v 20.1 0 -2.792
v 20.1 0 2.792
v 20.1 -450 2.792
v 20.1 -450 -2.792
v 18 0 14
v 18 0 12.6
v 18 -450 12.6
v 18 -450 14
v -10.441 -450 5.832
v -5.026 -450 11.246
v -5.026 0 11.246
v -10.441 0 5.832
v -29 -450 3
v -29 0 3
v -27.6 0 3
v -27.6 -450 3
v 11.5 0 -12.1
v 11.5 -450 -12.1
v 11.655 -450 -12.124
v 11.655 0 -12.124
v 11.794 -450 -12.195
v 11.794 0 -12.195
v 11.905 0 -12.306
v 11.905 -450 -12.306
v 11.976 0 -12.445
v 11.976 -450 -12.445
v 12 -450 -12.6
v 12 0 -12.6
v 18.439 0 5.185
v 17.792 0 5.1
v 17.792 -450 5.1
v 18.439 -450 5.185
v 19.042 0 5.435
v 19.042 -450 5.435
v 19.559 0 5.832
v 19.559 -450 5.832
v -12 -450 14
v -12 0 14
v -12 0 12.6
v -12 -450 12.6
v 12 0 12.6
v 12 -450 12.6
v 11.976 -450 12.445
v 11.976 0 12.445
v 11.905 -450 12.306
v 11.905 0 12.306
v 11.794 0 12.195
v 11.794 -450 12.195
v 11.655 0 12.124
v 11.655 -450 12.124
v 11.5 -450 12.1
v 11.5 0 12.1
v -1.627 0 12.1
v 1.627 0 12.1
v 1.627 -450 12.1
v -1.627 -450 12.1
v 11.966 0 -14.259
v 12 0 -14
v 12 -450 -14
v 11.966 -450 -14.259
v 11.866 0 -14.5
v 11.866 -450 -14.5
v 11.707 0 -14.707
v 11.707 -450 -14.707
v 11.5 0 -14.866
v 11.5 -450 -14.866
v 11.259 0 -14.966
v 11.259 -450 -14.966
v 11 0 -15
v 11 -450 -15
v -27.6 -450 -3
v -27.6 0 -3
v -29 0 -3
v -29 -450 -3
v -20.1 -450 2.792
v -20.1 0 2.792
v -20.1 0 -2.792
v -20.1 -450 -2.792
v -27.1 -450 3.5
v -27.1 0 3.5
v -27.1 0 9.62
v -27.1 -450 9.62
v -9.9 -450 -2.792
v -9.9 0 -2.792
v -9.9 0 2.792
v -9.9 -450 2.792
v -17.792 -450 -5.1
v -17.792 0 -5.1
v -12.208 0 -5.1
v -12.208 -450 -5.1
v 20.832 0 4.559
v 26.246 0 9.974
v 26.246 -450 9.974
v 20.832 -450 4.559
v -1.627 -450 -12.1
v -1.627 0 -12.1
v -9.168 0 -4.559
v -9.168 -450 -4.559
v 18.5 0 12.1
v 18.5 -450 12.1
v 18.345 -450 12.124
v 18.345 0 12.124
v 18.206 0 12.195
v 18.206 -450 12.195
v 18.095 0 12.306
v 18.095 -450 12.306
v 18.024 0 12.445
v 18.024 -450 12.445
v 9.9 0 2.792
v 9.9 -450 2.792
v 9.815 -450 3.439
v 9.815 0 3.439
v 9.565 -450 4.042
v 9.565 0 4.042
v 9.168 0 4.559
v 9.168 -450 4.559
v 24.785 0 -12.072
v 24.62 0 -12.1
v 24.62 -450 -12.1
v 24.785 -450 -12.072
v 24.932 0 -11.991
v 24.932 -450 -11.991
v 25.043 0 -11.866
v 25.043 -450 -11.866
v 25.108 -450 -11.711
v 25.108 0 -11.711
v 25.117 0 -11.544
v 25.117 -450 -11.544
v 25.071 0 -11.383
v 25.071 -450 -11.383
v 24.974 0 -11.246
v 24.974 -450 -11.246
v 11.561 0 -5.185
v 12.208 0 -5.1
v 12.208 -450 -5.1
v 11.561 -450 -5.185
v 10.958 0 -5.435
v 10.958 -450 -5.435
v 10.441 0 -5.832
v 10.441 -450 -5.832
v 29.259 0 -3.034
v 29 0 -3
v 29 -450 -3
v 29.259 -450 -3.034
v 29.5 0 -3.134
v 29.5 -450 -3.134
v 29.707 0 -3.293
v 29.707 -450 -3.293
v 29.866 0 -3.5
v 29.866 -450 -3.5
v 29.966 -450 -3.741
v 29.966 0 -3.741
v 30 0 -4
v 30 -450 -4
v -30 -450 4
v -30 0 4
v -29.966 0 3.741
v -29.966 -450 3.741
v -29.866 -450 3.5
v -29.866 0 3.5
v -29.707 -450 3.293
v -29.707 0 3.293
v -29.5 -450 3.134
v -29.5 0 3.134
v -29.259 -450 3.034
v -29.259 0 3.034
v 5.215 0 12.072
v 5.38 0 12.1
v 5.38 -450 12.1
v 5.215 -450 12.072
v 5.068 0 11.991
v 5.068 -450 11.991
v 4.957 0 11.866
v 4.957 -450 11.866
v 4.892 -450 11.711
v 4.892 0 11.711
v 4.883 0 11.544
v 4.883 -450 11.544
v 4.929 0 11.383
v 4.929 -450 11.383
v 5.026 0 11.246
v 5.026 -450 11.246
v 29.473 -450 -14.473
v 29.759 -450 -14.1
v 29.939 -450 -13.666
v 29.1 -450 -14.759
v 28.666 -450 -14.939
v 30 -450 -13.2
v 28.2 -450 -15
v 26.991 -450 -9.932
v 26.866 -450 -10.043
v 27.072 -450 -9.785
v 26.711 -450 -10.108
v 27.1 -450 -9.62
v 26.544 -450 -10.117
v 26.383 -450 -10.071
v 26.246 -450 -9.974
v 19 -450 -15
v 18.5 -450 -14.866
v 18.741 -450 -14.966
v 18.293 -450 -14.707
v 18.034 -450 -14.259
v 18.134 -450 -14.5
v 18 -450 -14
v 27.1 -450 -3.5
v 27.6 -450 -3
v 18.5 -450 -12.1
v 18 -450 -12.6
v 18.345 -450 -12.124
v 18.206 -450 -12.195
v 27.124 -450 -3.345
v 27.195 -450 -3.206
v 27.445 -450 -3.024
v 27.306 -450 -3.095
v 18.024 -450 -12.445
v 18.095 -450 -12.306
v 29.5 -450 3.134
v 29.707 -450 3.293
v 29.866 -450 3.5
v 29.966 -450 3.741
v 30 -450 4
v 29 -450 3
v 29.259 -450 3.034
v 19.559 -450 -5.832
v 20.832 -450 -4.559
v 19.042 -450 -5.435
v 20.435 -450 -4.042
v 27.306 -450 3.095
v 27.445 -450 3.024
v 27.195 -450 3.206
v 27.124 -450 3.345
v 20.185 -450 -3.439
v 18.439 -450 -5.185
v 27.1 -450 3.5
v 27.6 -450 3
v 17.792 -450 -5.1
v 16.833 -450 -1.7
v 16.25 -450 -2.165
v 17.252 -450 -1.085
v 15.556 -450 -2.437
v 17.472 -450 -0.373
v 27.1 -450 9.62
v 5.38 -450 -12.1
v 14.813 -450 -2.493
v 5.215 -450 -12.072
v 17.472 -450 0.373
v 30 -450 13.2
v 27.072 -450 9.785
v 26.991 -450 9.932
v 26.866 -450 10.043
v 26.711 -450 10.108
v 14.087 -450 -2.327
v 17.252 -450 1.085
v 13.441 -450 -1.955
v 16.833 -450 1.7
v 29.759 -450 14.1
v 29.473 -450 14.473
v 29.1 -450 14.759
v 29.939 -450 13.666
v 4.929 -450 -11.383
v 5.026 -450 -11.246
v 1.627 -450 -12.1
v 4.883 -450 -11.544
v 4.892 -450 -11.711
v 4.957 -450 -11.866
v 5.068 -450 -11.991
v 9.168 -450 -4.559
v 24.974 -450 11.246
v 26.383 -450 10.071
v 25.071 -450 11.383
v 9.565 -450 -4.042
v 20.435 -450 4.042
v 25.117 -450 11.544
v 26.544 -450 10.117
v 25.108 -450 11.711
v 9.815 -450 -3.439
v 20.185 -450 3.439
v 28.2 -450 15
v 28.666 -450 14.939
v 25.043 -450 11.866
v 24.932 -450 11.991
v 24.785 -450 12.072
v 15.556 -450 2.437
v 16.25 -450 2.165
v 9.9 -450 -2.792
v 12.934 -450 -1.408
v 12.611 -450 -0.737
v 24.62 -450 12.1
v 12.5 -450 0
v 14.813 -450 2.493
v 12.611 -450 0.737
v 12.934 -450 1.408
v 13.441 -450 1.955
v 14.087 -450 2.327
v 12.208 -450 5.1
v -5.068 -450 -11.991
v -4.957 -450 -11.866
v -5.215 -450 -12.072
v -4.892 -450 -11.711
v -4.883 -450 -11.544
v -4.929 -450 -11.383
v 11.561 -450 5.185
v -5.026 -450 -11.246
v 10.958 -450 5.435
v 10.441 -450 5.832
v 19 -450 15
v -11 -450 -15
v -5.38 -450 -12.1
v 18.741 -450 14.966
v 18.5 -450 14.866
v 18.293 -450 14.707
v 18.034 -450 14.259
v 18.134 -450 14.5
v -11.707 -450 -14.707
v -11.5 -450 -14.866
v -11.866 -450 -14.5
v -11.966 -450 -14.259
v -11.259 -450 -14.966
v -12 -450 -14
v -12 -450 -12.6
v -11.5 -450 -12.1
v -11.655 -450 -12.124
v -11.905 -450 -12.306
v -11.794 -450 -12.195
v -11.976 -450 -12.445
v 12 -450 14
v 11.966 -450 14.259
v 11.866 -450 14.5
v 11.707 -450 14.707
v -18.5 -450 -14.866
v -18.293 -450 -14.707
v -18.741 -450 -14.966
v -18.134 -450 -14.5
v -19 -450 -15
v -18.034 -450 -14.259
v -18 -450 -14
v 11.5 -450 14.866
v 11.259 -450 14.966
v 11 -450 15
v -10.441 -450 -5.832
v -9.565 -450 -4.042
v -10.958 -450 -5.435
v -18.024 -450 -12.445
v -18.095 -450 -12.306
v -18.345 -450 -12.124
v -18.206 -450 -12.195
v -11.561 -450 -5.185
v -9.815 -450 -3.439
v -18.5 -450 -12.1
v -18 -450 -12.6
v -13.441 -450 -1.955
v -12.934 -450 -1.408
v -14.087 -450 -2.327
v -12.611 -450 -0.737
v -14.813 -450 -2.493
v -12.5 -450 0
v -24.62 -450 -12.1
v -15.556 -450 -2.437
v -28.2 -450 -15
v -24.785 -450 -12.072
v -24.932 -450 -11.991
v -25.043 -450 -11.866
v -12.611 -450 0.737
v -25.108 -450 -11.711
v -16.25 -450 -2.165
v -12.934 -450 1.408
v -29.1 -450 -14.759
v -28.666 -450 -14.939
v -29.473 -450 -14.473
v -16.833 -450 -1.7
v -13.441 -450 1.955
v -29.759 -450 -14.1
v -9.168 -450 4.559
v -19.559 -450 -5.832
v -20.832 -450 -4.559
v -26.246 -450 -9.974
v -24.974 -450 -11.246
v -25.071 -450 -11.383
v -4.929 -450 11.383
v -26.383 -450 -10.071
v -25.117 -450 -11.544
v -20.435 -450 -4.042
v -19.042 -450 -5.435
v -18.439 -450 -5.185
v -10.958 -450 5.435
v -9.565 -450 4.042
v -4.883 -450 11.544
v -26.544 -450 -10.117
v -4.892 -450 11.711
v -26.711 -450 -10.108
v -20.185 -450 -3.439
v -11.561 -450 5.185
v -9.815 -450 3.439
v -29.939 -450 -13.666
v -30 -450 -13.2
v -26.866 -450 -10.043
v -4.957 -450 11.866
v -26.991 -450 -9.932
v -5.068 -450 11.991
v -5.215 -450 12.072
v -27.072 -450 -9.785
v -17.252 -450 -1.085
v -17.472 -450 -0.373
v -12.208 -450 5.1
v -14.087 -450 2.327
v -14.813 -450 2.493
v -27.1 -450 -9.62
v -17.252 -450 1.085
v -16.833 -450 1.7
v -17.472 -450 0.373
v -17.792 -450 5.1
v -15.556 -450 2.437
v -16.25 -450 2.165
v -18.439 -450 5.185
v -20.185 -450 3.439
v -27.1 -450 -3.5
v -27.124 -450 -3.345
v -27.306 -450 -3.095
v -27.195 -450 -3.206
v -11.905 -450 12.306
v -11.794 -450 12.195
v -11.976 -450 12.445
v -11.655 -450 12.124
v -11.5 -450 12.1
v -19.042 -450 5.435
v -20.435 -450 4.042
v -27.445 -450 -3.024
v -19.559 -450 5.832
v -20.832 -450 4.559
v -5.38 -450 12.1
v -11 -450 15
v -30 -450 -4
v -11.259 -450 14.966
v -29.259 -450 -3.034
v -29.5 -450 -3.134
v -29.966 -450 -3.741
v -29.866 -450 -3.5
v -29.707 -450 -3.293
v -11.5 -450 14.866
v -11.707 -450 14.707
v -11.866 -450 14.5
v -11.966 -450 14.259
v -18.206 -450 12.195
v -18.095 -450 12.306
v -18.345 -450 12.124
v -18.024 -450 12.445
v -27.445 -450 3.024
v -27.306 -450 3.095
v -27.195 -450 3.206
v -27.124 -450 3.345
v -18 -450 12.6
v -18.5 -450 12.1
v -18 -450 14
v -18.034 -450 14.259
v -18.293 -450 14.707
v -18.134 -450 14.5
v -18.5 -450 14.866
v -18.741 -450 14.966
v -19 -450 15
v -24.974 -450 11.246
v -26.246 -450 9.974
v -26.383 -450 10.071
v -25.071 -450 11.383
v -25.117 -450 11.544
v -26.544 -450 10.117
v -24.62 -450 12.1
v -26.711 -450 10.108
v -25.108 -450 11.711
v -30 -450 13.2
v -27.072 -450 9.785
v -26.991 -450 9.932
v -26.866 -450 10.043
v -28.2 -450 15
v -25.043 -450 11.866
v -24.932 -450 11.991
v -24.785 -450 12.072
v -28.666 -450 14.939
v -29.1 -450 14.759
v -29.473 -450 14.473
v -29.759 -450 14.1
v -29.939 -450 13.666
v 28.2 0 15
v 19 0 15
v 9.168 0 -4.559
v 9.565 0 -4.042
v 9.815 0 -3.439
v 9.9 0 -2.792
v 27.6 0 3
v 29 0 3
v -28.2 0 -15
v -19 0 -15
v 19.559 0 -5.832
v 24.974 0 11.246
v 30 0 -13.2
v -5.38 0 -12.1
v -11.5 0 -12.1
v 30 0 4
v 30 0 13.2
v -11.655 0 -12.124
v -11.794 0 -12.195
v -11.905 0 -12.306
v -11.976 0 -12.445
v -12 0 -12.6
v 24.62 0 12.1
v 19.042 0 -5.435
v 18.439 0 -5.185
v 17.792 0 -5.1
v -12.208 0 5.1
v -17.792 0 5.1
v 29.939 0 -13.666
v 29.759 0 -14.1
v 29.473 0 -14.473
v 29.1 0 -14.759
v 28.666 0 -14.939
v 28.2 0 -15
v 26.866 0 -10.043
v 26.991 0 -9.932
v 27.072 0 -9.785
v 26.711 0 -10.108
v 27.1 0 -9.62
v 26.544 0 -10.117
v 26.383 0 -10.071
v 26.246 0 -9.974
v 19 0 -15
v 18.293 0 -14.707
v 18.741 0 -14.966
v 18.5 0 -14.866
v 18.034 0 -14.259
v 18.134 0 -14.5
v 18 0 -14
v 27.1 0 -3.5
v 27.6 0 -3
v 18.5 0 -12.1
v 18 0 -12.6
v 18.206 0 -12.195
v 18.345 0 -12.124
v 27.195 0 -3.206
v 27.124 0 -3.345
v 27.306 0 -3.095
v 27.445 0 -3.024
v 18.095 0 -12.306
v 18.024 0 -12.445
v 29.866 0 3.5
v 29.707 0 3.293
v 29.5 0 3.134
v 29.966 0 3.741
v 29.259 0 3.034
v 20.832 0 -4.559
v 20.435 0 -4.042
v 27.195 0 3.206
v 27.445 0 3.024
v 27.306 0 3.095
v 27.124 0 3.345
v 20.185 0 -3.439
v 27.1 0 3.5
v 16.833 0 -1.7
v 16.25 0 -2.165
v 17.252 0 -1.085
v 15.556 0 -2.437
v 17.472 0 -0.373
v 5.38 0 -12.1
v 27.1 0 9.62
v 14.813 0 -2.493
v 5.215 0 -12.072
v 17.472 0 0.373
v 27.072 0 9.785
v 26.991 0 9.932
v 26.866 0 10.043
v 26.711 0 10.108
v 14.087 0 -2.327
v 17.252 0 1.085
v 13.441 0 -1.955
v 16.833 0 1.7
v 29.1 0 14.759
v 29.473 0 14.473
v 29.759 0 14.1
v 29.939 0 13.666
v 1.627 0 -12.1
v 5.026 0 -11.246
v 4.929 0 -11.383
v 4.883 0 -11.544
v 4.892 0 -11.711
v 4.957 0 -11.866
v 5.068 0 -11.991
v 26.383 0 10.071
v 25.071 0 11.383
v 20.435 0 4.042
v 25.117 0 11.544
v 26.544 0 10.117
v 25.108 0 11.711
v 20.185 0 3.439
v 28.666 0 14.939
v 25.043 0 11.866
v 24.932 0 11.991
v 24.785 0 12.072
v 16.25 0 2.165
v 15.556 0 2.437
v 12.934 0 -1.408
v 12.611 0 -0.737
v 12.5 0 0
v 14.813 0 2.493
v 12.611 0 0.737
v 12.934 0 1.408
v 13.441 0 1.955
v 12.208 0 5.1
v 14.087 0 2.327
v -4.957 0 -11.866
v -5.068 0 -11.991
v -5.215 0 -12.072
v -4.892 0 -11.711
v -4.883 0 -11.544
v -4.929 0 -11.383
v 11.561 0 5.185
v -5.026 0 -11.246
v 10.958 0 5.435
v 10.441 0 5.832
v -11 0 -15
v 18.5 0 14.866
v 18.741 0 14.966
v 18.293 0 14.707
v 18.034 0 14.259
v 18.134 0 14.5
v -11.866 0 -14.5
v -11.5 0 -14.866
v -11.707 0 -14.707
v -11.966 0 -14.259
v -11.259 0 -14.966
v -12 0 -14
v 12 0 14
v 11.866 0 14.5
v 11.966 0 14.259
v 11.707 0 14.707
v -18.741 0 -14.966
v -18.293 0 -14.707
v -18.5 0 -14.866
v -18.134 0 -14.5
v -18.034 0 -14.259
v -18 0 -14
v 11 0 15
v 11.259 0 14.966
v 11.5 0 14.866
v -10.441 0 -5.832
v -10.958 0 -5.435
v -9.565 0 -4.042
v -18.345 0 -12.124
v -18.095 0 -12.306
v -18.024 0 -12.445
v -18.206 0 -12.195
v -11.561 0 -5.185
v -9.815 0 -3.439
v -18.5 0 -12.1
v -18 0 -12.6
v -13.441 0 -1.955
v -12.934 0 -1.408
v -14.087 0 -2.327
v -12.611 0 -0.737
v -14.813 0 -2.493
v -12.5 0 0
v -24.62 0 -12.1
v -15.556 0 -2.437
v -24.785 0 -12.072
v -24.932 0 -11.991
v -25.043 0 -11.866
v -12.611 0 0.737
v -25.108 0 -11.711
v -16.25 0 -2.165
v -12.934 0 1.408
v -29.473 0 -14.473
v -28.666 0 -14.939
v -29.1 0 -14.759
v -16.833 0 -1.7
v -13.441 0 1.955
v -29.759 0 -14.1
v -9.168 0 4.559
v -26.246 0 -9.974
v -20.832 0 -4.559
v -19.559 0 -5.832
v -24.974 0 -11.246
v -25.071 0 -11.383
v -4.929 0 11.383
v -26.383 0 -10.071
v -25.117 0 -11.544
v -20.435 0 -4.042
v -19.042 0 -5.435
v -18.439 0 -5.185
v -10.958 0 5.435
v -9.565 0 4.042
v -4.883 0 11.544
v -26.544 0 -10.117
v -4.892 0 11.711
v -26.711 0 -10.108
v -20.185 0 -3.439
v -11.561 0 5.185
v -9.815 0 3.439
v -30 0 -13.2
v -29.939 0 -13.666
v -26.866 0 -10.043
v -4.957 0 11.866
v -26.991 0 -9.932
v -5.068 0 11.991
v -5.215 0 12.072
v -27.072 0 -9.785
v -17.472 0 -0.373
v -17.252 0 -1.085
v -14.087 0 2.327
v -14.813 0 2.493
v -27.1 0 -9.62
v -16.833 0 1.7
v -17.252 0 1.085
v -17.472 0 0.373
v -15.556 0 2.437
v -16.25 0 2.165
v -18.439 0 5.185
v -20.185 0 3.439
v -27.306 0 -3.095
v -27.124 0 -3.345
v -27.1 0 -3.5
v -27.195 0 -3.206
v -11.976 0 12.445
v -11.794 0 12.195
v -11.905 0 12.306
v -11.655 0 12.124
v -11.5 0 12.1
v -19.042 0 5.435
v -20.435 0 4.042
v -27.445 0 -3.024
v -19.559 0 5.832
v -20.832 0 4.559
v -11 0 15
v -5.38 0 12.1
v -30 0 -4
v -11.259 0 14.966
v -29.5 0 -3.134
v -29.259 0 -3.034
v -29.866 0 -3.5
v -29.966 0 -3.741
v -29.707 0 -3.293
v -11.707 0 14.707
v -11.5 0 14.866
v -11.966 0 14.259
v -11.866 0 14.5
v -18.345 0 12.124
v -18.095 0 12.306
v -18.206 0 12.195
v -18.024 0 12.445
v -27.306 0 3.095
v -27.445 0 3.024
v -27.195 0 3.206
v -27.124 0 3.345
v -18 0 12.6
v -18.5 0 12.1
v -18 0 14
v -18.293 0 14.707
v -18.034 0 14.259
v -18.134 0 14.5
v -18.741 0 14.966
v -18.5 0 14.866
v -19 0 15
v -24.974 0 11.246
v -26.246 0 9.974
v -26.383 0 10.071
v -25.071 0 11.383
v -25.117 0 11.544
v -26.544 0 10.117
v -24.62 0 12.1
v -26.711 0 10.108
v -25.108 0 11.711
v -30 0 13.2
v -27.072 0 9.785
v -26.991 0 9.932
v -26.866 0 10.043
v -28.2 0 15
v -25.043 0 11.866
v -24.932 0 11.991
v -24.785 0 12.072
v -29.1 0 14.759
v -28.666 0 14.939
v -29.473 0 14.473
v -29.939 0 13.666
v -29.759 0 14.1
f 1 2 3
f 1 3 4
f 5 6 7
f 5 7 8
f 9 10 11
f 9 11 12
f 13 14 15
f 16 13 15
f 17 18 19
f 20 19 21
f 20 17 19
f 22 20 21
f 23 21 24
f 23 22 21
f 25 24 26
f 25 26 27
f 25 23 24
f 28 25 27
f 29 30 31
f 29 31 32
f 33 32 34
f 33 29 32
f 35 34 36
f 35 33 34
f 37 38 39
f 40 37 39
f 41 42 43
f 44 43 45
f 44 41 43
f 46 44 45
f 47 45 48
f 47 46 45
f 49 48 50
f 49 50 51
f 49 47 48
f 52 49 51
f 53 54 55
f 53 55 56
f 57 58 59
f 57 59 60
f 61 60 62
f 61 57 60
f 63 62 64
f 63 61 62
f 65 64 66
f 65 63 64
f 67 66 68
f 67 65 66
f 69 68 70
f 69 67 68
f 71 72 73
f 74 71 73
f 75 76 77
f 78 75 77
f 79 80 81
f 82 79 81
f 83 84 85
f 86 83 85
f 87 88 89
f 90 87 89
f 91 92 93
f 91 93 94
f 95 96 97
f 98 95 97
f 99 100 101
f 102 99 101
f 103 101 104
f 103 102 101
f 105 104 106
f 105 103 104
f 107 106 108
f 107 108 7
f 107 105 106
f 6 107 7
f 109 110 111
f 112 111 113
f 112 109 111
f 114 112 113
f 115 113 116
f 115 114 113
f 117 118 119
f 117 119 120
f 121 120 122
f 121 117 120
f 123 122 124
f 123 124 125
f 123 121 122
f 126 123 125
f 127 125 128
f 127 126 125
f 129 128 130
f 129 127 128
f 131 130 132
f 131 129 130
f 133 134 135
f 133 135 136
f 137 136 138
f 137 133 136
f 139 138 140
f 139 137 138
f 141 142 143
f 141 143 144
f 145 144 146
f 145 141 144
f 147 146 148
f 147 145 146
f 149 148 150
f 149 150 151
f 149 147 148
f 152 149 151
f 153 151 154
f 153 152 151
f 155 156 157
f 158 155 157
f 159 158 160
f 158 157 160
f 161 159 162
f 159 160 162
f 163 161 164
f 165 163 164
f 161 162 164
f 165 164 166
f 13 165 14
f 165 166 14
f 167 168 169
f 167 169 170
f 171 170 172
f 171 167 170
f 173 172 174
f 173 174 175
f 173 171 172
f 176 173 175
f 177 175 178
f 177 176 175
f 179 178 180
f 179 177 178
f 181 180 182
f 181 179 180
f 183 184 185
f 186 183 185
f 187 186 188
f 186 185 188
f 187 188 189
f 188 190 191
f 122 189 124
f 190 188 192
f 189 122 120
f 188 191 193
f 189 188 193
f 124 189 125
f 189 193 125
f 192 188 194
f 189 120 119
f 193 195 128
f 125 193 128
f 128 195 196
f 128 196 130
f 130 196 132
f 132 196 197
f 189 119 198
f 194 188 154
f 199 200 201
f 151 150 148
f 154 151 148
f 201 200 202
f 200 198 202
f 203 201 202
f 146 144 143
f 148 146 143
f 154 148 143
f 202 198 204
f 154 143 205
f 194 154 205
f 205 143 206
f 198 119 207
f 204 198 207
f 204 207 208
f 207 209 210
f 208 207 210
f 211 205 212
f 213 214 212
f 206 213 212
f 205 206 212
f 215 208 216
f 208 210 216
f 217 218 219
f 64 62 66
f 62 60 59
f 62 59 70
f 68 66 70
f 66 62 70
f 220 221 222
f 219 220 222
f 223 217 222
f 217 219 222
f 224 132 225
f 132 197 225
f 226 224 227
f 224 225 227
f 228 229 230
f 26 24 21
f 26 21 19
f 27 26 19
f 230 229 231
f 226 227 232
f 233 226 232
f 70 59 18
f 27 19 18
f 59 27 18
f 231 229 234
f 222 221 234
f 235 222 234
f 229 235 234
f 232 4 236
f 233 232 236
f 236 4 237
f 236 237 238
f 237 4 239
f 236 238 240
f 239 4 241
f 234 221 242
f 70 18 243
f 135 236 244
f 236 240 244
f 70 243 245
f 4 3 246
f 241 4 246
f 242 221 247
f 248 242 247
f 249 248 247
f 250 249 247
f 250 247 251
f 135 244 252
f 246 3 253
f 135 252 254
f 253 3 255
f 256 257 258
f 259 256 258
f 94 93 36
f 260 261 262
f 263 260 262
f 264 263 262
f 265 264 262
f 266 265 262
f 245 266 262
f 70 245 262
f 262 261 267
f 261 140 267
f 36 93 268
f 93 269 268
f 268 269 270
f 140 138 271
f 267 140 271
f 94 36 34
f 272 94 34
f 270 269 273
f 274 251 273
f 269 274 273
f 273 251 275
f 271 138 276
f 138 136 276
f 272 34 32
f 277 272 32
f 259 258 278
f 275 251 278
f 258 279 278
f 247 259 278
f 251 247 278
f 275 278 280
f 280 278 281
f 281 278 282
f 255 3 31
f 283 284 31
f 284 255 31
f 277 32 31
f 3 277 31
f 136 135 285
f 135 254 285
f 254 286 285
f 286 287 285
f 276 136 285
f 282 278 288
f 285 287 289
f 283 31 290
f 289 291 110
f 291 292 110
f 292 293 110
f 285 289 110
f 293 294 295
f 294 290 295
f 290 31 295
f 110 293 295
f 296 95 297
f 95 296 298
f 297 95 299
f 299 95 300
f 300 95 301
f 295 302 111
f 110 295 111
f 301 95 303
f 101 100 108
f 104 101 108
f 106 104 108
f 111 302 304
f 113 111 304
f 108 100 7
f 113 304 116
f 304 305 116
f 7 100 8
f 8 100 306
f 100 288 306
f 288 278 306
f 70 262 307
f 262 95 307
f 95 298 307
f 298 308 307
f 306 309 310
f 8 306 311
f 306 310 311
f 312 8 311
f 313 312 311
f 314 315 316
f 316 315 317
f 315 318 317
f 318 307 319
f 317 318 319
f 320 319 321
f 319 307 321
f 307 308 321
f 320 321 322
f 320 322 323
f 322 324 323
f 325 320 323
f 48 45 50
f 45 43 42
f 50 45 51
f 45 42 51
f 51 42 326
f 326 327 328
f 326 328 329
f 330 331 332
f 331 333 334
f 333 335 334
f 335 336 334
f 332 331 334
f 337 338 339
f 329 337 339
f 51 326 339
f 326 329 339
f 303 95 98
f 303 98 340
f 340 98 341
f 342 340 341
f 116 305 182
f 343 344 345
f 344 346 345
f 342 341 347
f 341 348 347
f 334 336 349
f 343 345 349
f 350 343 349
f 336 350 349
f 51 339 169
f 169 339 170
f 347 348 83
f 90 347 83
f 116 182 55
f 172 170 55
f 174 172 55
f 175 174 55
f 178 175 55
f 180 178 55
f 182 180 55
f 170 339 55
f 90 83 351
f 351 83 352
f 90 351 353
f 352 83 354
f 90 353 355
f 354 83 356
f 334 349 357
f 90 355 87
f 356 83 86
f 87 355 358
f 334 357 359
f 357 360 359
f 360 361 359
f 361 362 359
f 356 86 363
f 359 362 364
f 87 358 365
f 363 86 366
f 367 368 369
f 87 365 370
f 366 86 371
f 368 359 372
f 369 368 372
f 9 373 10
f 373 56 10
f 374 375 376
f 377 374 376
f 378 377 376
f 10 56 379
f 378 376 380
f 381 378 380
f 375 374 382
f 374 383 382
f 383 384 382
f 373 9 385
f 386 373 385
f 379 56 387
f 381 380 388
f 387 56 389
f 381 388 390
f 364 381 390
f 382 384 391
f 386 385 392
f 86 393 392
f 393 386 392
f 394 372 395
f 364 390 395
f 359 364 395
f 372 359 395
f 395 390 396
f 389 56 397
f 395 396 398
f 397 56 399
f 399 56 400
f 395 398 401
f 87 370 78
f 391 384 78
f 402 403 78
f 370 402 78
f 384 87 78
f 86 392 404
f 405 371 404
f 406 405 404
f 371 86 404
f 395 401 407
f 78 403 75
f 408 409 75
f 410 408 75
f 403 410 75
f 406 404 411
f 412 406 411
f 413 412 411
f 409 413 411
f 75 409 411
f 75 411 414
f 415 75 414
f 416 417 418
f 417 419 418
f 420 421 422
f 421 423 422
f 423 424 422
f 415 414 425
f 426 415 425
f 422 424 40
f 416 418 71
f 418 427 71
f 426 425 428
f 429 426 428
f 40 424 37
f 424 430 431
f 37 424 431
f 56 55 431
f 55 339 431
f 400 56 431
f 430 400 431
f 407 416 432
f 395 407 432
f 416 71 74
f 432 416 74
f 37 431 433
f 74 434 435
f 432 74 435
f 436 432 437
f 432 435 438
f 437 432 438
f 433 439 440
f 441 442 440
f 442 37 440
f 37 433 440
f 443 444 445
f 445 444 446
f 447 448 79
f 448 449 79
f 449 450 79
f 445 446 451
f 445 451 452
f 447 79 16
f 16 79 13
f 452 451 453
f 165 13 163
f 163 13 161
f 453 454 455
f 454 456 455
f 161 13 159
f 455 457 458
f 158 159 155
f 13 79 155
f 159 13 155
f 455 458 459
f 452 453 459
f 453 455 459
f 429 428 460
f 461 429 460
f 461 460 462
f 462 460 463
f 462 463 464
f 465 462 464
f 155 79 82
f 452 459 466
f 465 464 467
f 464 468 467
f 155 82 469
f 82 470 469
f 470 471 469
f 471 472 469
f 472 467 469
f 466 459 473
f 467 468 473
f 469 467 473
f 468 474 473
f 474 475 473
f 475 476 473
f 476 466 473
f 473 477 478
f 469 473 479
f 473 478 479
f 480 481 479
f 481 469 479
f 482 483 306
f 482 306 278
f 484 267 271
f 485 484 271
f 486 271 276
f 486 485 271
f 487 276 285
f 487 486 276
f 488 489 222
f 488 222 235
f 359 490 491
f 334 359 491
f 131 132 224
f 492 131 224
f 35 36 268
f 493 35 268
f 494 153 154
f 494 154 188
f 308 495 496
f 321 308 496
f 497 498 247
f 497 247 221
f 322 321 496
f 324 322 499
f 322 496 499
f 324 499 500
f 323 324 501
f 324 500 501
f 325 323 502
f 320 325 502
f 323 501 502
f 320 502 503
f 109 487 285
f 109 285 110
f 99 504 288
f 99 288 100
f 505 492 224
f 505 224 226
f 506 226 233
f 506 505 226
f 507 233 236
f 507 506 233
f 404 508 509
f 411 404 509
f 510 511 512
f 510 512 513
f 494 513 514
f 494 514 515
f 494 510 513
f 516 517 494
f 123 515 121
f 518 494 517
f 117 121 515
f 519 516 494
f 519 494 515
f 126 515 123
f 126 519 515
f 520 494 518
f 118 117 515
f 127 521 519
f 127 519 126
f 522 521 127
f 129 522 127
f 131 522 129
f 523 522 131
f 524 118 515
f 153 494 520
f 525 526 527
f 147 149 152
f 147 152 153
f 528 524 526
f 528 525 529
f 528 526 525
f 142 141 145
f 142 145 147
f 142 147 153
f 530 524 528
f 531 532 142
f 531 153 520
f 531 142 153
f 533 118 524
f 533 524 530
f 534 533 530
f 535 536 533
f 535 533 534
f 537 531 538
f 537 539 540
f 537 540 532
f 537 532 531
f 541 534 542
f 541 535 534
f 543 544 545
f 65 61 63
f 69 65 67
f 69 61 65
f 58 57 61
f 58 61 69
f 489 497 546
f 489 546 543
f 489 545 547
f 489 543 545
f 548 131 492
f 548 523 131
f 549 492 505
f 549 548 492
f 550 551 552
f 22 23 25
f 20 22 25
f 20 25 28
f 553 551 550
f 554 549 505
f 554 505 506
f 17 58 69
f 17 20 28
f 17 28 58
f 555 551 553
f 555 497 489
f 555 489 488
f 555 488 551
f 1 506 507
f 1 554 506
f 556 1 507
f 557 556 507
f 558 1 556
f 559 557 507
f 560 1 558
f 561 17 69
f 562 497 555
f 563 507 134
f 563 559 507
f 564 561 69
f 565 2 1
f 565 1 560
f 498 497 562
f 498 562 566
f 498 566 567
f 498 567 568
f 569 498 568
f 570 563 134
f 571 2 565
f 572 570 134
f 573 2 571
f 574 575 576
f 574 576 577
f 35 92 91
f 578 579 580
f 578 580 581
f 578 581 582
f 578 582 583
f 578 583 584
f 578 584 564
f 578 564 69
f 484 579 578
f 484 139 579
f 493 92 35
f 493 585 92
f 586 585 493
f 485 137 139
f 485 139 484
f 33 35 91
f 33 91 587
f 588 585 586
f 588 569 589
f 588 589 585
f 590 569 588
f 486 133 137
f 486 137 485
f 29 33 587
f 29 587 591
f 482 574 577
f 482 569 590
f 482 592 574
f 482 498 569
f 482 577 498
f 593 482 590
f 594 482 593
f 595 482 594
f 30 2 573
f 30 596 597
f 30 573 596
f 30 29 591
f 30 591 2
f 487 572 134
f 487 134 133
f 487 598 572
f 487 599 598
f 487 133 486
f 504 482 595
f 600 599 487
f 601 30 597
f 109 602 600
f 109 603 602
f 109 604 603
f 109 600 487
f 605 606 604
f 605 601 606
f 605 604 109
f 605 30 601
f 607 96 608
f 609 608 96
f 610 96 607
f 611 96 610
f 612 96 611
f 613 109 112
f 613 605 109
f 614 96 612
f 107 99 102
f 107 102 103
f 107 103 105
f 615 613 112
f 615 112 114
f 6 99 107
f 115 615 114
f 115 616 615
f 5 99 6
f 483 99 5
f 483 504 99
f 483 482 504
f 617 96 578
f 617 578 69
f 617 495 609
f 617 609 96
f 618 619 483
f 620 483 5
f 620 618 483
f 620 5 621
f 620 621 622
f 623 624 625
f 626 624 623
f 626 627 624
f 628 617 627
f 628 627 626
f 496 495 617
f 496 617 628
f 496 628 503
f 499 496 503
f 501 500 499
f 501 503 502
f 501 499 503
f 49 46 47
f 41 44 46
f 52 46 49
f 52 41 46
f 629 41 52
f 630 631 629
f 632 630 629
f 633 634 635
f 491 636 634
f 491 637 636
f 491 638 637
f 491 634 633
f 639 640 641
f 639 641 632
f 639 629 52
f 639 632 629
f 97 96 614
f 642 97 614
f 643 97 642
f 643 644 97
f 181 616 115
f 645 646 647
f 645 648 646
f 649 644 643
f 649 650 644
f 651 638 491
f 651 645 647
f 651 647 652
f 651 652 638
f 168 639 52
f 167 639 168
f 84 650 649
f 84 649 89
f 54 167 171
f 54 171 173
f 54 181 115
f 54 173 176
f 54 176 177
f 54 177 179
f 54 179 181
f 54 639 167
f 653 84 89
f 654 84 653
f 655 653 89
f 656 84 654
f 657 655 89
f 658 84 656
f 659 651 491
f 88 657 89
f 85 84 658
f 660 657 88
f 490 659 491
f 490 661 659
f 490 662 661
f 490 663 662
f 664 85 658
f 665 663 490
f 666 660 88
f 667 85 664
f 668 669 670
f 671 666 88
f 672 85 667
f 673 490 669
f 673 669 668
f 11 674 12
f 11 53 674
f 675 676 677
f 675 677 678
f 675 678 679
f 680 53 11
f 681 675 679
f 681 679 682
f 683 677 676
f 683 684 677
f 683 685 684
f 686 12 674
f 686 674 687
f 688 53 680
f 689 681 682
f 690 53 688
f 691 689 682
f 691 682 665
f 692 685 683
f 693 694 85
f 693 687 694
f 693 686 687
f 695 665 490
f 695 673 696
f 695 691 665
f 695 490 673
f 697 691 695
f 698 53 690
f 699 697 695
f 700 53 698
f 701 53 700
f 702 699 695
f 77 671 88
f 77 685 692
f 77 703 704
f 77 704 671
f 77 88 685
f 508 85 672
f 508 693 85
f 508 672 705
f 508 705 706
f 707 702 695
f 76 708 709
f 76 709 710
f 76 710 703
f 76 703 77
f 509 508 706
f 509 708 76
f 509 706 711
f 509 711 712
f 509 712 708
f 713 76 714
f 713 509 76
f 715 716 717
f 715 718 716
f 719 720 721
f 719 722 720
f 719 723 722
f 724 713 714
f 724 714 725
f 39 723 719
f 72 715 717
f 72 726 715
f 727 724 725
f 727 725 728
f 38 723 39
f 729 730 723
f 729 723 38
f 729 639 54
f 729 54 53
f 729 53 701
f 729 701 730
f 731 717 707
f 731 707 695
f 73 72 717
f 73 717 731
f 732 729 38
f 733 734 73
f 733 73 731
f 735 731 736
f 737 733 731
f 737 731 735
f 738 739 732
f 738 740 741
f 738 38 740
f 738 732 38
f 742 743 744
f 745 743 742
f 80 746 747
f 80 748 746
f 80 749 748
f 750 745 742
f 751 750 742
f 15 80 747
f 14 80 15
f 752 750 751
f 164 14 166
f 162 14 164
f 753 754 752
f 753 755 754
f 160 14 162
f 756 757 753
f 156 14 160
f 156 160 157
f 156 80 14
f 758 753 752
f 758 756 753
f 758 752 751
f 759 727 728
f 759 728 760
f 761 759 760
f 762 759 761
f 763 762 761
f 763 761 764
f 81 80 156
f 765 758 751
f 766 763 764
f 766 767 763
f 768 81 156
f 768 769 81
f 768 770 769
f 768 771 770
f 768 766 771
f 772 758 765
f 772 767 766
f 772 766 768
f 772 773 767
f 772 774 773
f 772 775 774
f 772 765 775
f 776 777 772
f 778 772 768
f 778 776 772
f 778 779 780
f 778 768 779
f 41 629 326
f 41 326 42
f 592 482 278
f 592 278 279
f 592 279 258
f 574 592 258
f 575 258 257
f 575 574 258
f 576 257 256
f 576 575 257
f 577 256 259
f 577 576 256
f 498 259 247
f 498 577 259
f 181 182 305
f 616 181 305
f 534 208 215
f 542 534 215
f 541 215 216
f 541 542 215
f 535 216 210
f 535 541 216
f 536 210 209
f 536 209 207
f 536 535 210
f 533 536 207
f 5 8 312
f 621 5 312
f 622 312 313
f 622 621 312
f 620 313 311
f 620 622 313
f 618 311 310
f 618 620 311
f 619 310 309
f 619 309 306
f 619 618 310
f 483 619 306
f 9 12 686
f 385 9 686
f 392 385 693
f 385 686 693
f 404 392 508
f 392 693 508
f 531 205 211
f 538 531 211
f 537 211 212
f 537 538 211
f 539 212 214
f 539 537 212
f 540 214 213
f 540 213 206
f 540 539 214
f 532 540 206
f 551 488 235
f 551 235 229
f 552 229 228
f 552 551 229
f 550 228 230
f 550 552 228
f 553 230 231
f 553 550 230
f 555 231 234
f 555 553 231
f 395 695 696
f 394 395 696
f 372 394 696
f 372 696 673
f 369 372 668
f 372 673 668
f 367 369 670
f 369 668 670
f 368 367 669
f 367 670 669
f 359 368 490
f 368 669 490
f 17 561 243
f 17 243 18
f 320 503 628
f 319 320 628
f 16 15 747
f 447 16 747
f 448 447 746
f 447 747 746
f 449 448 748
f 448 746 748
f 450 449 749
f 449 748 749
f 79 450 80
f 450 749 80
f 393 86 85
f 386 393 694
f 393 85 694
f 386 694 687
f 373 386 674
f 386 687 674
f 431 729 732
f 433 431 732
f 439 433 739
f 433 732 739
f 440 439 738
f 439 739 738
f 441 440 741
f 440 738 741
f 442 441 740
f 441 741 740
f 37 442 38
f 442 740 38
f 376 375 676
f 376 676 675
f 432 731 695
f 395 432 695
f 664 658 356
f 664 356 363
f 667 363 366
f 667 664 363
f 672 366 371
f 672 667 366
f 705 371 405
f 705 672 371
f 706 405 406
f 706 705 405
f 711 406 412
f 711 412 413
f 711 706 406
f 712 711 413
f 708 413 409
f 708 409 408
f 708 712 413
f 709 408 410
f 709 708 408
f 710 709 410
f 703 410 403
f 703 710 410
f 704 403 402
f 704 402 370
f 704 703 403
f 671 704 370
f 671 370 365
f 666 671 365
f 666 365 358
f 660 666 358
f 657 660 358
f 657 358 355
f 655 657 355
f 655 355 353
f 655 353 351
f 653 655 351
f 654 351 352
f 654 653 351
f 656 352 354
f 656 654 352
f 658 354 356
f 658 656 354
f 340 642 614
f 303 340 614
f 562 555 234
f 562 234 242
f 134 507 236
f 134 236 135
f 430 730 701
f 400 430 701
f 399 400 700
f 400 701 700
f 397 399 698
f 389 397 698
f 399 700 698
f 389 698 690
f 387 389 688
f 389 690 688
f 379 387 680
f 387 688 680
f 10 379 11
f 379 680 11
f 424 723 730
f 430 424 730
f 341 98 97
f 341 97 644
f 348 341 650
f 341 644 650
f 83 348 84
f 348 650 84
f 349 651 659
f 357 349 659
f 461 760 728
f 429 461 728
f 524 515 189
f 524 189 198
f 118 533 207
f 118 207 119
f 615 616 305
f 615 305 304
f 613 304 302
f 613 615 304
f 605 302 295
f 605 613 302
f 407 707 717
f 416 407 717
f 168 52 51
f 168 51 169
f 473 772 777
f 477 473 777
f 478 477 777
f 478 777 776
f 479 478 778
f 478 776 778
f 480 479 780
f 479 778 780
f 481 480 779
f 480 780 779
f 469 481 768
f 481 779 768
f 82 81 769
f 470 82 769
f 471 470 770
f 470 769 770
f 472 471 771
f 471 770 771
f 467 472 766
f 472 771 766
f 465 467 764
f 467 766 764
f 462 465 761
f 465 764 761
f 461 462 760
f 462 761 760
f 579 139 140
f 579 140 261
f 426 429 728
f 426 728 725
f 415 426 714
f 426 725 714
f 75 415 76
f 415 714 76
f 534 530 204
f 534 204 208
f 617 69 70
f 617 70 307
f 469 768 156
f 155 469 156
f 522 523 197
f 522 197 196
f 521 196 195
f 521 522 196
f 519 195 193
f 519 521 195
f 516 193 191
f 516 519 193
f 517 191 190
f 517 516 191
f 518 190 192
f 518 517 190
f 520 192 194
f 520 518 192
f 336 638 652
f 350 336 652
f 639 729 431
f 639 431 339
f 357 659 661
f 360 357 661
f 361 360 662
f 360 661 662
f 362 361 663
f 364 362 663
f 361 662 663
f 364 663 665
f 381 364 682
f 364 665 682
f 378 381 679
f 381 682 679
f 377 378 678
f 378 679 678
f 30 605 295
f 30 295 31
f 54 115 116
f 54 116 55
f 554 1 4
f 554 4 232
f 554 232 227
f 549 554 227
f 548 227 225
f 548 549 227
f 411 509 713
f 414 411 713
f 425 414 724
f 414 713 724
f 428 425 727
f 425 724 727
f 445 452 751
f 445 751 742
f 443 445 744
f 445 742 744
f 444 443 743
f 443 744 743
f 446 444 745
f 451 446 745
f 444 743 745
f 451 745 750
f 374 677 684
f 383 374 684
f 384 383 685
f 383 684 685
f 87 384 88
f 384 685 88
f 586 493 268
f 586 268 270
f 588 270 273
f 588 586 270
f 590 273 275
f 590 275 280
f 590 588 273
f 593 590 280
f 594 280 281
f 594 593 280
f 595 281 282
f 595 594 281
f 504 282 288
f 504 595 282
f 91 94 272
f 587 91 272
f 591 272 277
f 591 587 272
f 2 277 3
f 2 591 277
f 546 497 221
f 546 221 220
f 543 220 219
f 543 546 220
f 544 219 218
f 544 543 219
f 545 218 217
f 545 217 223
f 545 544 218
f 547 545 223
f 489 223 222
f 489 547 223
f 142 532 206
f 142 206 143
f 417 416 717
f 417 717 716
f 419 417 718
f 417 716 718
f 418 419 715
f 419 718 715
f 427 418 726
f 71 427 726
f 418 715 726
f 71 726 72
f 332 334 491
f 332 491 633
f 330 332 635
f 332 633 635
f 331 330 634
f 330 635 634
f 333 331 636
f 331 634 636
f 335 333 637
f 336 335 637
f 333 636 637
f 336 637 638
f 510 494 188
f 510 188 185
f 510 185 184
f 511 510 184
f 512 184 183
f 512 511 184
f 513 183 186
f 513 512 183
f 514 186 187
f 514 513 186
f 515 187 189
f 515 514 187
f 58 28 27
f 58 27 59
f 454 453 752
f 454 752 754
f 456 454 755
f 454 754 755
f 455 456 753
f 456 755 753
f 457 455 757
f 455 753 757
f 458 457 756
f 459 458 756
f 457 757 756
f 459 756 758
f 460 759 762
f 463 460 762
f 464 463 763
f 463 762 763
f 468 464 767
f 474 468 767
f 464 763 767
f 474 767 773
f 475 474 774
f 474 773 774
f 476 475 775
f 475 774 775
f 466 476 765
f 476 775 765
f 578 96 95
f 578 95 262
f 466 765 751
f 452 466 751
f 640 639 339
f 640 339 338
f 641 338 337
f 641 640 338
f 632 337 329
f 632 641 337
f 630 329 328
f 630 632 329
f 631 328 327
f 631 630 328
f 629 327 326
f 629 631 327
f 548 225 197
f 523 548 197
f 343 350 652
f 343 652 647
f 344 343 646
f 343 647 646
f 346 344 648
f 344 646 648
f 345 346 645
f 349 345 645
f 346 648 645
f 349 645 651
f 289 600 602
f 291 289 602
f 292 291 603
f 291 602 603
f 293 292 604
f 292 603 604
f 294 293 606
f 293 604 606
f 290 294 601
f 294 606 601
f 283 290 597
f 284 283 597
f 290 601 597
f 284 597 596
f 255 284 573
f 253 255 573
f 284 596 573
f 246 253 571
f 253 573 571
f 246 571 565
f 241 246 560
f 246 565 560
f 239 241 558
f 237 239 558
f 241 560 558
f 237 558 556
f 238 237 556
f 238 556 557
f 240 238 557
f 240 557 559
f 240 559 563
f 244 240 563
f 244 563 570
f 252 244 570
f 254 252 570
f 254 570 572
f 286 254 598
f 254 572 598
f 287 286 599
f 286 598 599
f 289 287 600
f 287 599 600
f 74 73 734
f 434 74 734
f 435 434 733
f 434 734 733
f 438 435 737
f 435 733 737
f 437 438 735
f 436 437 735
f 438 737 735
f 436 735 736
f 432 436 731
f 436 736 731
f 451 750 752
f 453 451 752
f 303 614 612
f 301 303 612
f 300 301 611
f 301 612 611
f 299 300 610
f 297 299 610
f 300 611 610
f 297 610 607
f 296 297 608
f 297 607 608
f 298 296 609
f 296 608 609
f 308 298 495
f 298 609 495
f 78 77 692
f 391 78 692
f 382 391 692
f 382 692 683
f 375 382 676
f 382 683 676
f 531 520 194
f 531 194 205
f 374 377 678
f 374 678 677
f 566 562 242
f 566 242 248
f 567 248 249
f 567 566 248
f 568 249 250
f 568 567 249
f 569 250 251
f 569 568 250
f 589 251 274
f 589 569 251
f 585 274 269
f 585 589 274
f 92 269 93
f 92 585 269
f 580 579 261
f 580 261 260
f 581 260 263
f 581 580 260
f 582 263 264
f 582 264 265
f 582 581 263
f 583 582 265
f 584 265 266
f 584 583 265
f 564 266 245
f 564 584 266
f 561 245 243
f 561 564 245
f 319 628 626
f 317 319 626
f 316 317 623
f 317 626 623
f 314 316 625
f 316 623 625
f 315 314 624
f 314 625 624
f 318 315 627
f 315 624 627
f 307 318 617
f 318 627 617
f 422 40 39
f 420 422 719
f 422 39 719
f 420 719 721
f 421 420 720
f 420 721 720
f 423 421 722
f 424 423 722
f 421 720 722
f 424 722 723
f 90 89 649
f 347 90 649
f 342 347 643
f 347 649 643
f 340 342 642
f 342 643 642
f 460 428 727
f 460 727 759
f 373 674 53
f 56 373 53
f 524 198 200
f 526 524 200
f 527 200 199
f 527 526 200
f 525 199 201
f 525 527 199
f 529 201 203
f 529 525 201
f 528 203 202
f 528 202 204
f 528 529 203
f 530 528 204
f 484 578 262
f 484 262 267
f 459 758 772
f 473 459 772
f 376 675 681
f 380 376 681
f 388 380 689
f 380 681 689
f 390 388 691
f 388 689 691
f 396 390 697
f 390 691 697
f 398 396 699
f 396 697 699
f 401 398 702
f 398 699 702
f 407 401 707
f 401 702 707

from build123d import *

# Parameters (mm, degrees)
F0_R     = 2.5
F1_DEPTH = 450


with BuildPart() as f1:
    # F0 (on Front) → F1 (new body)
    with BuildSketch(Plane.XZ):
        with BuildLine():
            ThreePointArc((-30, -13.2), (-29.472792, -14.472792), (-28.2, -15))
            Line((-28.2, -15), (-19, -15))
            ThreePointArc((-19, -15), (-18.292893, -14.707107), (-18, -14))
            Line((-18, -14), (-18, -12.6))
            ThreePointArc((-18, -12.6), (-18.146447, -12.246447), (-18.5, -12.1))
            Line((-18.5, -12.1), (-24.620101, -12.1))
            ThreePointArc((-24.620101, -12.1), (-25.082041, -11.791342), (-24.973654, -11.246447))
            Line((-24.973654, -11.246447), (-19.559441, -5.832233))
            ThreePointArc((-19.559441, -5.832233), (-18.748382, -5.290301), (-17.791674, -5.1))
            Line((-17.791674, -5.1), (-12.208326, -5.1))
            ThreePointArc((-12.208326, -5.1), (-11.251618, -5.290301), (-10.440559, -5.832233))
            Line((-10.440559, -5.832233), (-5.026346, -11.246447))
            ThreePointArc((-5.026346, -11.246447), (-4.917959, -11.791342), (-5.379899, -12.1))
            Line((-5.379899, -12.1), (-11.5, -12.1))
            ThreePointArc((-11.5, -12.1), (-11.853553, -12.246447), (-12, -12.6))
            Line((-12, -12.6), (-12, -14))
            ThreePointArc((-12, -14), (-11.707107, -14.707107), (-11, -15))
            Line((-11, -15), (0, -15))
            Line((0, -15), (0, -12.1))
            Line((0, -12.1), (-1.627208, -12.1))
            Line((-1.627208, -12.1), (-9.167767, -4.559441))
            ThreePointArc((-9.167767, -4.559441), (-9.709699, -3.748382), (-9.9, -2.791674))
            Line((-9.9, -2.791674), (-9.9, 2.791674))
            ThreePointArc((-9.9, 2.791674), (-9.709699, 3.748382), (-9.167767, 4.559441))
            Line((-9.167767, 4.559441), (-1.627208, 12.1))
            Line((-1.627208, 12.1), (0, 12.1))
            Line((0, 12.1), (0, 15))
            Line((0, 15), (-11, 15))
            ThreePointArc((-11, 15), (-11.707107, 14.707107), (-12, 14))
            Line((-12, 14), (-12, 12.6))
            ThreePointArc((-12, 12.6), (-11.853553, 12.246447), (-11.5, 12.1))
            Line((-11.5, 12.1), (-5.379899, 12.1))
            ThreePointArc((-5.379899, 12.1), (-4.917959, 11.791342), (-5.026346, 11.246447))
            Line((-5.026346, 11.246447), (-10.440559, 5.832233))
            ThreePointArc((-10.440559, 5.832233), (-11.251618, 5.290301), (-12.208326, 5.1))
            Line((-12.208326, 5.1), (-17.791674, 5.1))
            ThreePointArc((-17.791674, 5.1), (-18.748382, 5.290301), (-19.559441, 5.832233))
            Line((-19.559441, 5.832233), (-24.973654, 11.246447))
            ThreePointArc((-24.973654, 11.246447), (-25.082041, 11.791342), (-24.620101, 12.1))
            Line((-24.620101, 12.1), (-18.5, 12.1))
            ThreePointArc((-18.5, 12.1), (-18.146447, 12.246447), (-18, 12.6))
            Line((-18, 12.6), (-18, 14))
            ThreePointArc((-18, 14), (-18.292893, 14.707107), (-19, 15))
            Line((-19, 15), (-28.2, 15))
            ThreePointArc((-28.2, 15), (-29.472792, 14.472792), (-30, 13.2))
            Line((-30, 13.2), (-30, 4))
            ThreePointArc((-30, 4), (-29.707107, 3.292893), (-29, 3))
            Line((-29, 3), (-27.6, 3))
            ThreePointArc((-27.6, 3), (-27.246447, 3.146447), (-27.1, 3.5))
            Line((-27.1, 3.5), (-27.1, 9.620101))
            ThreePointArc((-27.1, 9.620101), (-26.791342, 10.082041), (-26.246447, 9.973654))
            Line((-26.246447, 9.973654), (-20.832233, 4.559441))
            ThreePointArc((-20.832233, 4.559441), (-20.290301, 3.748382), (-20.1, 2.791674))
            Line((-20.1, 2.791674), (-20.1, -2.791674))
            ThreePointArc((-20.1, -2.791674), (-20.290301, -3.748382), (-20.832233, -4.559441))
            Line((-20.832233, -4.559441), (-26.246447, -9.973654))
            ThreePointArc((-26.246447, -9.973654), (-26.791342, -10.082041), (-27.1, -9.620101))
            Line((-27.1, -9.620101), (-27.1, -3.5))
            ThreePointArc((-27.1, -3.5), (-27.246447, -3.146447), (-27.6, -3))
            Line((-27.6, -3), (-29, -3))
            ThreePointArc((-29, -3), (-29.707107, -3.292893), (-30, -4))
            Line((-30, -4), (-30, -13.2))
        make_face()
        with Locations((-15, 0)):
            Circle(F0_R, mode=Mode.SUBTRACT)
    extrude(amount=F1_DEPTH)

    # F2: F1 across plane


with BuildPart() as f1_1:
    add(f1.part)
    add(f1.part.mirror(Plane.YZ))


solid = f1_1.part
